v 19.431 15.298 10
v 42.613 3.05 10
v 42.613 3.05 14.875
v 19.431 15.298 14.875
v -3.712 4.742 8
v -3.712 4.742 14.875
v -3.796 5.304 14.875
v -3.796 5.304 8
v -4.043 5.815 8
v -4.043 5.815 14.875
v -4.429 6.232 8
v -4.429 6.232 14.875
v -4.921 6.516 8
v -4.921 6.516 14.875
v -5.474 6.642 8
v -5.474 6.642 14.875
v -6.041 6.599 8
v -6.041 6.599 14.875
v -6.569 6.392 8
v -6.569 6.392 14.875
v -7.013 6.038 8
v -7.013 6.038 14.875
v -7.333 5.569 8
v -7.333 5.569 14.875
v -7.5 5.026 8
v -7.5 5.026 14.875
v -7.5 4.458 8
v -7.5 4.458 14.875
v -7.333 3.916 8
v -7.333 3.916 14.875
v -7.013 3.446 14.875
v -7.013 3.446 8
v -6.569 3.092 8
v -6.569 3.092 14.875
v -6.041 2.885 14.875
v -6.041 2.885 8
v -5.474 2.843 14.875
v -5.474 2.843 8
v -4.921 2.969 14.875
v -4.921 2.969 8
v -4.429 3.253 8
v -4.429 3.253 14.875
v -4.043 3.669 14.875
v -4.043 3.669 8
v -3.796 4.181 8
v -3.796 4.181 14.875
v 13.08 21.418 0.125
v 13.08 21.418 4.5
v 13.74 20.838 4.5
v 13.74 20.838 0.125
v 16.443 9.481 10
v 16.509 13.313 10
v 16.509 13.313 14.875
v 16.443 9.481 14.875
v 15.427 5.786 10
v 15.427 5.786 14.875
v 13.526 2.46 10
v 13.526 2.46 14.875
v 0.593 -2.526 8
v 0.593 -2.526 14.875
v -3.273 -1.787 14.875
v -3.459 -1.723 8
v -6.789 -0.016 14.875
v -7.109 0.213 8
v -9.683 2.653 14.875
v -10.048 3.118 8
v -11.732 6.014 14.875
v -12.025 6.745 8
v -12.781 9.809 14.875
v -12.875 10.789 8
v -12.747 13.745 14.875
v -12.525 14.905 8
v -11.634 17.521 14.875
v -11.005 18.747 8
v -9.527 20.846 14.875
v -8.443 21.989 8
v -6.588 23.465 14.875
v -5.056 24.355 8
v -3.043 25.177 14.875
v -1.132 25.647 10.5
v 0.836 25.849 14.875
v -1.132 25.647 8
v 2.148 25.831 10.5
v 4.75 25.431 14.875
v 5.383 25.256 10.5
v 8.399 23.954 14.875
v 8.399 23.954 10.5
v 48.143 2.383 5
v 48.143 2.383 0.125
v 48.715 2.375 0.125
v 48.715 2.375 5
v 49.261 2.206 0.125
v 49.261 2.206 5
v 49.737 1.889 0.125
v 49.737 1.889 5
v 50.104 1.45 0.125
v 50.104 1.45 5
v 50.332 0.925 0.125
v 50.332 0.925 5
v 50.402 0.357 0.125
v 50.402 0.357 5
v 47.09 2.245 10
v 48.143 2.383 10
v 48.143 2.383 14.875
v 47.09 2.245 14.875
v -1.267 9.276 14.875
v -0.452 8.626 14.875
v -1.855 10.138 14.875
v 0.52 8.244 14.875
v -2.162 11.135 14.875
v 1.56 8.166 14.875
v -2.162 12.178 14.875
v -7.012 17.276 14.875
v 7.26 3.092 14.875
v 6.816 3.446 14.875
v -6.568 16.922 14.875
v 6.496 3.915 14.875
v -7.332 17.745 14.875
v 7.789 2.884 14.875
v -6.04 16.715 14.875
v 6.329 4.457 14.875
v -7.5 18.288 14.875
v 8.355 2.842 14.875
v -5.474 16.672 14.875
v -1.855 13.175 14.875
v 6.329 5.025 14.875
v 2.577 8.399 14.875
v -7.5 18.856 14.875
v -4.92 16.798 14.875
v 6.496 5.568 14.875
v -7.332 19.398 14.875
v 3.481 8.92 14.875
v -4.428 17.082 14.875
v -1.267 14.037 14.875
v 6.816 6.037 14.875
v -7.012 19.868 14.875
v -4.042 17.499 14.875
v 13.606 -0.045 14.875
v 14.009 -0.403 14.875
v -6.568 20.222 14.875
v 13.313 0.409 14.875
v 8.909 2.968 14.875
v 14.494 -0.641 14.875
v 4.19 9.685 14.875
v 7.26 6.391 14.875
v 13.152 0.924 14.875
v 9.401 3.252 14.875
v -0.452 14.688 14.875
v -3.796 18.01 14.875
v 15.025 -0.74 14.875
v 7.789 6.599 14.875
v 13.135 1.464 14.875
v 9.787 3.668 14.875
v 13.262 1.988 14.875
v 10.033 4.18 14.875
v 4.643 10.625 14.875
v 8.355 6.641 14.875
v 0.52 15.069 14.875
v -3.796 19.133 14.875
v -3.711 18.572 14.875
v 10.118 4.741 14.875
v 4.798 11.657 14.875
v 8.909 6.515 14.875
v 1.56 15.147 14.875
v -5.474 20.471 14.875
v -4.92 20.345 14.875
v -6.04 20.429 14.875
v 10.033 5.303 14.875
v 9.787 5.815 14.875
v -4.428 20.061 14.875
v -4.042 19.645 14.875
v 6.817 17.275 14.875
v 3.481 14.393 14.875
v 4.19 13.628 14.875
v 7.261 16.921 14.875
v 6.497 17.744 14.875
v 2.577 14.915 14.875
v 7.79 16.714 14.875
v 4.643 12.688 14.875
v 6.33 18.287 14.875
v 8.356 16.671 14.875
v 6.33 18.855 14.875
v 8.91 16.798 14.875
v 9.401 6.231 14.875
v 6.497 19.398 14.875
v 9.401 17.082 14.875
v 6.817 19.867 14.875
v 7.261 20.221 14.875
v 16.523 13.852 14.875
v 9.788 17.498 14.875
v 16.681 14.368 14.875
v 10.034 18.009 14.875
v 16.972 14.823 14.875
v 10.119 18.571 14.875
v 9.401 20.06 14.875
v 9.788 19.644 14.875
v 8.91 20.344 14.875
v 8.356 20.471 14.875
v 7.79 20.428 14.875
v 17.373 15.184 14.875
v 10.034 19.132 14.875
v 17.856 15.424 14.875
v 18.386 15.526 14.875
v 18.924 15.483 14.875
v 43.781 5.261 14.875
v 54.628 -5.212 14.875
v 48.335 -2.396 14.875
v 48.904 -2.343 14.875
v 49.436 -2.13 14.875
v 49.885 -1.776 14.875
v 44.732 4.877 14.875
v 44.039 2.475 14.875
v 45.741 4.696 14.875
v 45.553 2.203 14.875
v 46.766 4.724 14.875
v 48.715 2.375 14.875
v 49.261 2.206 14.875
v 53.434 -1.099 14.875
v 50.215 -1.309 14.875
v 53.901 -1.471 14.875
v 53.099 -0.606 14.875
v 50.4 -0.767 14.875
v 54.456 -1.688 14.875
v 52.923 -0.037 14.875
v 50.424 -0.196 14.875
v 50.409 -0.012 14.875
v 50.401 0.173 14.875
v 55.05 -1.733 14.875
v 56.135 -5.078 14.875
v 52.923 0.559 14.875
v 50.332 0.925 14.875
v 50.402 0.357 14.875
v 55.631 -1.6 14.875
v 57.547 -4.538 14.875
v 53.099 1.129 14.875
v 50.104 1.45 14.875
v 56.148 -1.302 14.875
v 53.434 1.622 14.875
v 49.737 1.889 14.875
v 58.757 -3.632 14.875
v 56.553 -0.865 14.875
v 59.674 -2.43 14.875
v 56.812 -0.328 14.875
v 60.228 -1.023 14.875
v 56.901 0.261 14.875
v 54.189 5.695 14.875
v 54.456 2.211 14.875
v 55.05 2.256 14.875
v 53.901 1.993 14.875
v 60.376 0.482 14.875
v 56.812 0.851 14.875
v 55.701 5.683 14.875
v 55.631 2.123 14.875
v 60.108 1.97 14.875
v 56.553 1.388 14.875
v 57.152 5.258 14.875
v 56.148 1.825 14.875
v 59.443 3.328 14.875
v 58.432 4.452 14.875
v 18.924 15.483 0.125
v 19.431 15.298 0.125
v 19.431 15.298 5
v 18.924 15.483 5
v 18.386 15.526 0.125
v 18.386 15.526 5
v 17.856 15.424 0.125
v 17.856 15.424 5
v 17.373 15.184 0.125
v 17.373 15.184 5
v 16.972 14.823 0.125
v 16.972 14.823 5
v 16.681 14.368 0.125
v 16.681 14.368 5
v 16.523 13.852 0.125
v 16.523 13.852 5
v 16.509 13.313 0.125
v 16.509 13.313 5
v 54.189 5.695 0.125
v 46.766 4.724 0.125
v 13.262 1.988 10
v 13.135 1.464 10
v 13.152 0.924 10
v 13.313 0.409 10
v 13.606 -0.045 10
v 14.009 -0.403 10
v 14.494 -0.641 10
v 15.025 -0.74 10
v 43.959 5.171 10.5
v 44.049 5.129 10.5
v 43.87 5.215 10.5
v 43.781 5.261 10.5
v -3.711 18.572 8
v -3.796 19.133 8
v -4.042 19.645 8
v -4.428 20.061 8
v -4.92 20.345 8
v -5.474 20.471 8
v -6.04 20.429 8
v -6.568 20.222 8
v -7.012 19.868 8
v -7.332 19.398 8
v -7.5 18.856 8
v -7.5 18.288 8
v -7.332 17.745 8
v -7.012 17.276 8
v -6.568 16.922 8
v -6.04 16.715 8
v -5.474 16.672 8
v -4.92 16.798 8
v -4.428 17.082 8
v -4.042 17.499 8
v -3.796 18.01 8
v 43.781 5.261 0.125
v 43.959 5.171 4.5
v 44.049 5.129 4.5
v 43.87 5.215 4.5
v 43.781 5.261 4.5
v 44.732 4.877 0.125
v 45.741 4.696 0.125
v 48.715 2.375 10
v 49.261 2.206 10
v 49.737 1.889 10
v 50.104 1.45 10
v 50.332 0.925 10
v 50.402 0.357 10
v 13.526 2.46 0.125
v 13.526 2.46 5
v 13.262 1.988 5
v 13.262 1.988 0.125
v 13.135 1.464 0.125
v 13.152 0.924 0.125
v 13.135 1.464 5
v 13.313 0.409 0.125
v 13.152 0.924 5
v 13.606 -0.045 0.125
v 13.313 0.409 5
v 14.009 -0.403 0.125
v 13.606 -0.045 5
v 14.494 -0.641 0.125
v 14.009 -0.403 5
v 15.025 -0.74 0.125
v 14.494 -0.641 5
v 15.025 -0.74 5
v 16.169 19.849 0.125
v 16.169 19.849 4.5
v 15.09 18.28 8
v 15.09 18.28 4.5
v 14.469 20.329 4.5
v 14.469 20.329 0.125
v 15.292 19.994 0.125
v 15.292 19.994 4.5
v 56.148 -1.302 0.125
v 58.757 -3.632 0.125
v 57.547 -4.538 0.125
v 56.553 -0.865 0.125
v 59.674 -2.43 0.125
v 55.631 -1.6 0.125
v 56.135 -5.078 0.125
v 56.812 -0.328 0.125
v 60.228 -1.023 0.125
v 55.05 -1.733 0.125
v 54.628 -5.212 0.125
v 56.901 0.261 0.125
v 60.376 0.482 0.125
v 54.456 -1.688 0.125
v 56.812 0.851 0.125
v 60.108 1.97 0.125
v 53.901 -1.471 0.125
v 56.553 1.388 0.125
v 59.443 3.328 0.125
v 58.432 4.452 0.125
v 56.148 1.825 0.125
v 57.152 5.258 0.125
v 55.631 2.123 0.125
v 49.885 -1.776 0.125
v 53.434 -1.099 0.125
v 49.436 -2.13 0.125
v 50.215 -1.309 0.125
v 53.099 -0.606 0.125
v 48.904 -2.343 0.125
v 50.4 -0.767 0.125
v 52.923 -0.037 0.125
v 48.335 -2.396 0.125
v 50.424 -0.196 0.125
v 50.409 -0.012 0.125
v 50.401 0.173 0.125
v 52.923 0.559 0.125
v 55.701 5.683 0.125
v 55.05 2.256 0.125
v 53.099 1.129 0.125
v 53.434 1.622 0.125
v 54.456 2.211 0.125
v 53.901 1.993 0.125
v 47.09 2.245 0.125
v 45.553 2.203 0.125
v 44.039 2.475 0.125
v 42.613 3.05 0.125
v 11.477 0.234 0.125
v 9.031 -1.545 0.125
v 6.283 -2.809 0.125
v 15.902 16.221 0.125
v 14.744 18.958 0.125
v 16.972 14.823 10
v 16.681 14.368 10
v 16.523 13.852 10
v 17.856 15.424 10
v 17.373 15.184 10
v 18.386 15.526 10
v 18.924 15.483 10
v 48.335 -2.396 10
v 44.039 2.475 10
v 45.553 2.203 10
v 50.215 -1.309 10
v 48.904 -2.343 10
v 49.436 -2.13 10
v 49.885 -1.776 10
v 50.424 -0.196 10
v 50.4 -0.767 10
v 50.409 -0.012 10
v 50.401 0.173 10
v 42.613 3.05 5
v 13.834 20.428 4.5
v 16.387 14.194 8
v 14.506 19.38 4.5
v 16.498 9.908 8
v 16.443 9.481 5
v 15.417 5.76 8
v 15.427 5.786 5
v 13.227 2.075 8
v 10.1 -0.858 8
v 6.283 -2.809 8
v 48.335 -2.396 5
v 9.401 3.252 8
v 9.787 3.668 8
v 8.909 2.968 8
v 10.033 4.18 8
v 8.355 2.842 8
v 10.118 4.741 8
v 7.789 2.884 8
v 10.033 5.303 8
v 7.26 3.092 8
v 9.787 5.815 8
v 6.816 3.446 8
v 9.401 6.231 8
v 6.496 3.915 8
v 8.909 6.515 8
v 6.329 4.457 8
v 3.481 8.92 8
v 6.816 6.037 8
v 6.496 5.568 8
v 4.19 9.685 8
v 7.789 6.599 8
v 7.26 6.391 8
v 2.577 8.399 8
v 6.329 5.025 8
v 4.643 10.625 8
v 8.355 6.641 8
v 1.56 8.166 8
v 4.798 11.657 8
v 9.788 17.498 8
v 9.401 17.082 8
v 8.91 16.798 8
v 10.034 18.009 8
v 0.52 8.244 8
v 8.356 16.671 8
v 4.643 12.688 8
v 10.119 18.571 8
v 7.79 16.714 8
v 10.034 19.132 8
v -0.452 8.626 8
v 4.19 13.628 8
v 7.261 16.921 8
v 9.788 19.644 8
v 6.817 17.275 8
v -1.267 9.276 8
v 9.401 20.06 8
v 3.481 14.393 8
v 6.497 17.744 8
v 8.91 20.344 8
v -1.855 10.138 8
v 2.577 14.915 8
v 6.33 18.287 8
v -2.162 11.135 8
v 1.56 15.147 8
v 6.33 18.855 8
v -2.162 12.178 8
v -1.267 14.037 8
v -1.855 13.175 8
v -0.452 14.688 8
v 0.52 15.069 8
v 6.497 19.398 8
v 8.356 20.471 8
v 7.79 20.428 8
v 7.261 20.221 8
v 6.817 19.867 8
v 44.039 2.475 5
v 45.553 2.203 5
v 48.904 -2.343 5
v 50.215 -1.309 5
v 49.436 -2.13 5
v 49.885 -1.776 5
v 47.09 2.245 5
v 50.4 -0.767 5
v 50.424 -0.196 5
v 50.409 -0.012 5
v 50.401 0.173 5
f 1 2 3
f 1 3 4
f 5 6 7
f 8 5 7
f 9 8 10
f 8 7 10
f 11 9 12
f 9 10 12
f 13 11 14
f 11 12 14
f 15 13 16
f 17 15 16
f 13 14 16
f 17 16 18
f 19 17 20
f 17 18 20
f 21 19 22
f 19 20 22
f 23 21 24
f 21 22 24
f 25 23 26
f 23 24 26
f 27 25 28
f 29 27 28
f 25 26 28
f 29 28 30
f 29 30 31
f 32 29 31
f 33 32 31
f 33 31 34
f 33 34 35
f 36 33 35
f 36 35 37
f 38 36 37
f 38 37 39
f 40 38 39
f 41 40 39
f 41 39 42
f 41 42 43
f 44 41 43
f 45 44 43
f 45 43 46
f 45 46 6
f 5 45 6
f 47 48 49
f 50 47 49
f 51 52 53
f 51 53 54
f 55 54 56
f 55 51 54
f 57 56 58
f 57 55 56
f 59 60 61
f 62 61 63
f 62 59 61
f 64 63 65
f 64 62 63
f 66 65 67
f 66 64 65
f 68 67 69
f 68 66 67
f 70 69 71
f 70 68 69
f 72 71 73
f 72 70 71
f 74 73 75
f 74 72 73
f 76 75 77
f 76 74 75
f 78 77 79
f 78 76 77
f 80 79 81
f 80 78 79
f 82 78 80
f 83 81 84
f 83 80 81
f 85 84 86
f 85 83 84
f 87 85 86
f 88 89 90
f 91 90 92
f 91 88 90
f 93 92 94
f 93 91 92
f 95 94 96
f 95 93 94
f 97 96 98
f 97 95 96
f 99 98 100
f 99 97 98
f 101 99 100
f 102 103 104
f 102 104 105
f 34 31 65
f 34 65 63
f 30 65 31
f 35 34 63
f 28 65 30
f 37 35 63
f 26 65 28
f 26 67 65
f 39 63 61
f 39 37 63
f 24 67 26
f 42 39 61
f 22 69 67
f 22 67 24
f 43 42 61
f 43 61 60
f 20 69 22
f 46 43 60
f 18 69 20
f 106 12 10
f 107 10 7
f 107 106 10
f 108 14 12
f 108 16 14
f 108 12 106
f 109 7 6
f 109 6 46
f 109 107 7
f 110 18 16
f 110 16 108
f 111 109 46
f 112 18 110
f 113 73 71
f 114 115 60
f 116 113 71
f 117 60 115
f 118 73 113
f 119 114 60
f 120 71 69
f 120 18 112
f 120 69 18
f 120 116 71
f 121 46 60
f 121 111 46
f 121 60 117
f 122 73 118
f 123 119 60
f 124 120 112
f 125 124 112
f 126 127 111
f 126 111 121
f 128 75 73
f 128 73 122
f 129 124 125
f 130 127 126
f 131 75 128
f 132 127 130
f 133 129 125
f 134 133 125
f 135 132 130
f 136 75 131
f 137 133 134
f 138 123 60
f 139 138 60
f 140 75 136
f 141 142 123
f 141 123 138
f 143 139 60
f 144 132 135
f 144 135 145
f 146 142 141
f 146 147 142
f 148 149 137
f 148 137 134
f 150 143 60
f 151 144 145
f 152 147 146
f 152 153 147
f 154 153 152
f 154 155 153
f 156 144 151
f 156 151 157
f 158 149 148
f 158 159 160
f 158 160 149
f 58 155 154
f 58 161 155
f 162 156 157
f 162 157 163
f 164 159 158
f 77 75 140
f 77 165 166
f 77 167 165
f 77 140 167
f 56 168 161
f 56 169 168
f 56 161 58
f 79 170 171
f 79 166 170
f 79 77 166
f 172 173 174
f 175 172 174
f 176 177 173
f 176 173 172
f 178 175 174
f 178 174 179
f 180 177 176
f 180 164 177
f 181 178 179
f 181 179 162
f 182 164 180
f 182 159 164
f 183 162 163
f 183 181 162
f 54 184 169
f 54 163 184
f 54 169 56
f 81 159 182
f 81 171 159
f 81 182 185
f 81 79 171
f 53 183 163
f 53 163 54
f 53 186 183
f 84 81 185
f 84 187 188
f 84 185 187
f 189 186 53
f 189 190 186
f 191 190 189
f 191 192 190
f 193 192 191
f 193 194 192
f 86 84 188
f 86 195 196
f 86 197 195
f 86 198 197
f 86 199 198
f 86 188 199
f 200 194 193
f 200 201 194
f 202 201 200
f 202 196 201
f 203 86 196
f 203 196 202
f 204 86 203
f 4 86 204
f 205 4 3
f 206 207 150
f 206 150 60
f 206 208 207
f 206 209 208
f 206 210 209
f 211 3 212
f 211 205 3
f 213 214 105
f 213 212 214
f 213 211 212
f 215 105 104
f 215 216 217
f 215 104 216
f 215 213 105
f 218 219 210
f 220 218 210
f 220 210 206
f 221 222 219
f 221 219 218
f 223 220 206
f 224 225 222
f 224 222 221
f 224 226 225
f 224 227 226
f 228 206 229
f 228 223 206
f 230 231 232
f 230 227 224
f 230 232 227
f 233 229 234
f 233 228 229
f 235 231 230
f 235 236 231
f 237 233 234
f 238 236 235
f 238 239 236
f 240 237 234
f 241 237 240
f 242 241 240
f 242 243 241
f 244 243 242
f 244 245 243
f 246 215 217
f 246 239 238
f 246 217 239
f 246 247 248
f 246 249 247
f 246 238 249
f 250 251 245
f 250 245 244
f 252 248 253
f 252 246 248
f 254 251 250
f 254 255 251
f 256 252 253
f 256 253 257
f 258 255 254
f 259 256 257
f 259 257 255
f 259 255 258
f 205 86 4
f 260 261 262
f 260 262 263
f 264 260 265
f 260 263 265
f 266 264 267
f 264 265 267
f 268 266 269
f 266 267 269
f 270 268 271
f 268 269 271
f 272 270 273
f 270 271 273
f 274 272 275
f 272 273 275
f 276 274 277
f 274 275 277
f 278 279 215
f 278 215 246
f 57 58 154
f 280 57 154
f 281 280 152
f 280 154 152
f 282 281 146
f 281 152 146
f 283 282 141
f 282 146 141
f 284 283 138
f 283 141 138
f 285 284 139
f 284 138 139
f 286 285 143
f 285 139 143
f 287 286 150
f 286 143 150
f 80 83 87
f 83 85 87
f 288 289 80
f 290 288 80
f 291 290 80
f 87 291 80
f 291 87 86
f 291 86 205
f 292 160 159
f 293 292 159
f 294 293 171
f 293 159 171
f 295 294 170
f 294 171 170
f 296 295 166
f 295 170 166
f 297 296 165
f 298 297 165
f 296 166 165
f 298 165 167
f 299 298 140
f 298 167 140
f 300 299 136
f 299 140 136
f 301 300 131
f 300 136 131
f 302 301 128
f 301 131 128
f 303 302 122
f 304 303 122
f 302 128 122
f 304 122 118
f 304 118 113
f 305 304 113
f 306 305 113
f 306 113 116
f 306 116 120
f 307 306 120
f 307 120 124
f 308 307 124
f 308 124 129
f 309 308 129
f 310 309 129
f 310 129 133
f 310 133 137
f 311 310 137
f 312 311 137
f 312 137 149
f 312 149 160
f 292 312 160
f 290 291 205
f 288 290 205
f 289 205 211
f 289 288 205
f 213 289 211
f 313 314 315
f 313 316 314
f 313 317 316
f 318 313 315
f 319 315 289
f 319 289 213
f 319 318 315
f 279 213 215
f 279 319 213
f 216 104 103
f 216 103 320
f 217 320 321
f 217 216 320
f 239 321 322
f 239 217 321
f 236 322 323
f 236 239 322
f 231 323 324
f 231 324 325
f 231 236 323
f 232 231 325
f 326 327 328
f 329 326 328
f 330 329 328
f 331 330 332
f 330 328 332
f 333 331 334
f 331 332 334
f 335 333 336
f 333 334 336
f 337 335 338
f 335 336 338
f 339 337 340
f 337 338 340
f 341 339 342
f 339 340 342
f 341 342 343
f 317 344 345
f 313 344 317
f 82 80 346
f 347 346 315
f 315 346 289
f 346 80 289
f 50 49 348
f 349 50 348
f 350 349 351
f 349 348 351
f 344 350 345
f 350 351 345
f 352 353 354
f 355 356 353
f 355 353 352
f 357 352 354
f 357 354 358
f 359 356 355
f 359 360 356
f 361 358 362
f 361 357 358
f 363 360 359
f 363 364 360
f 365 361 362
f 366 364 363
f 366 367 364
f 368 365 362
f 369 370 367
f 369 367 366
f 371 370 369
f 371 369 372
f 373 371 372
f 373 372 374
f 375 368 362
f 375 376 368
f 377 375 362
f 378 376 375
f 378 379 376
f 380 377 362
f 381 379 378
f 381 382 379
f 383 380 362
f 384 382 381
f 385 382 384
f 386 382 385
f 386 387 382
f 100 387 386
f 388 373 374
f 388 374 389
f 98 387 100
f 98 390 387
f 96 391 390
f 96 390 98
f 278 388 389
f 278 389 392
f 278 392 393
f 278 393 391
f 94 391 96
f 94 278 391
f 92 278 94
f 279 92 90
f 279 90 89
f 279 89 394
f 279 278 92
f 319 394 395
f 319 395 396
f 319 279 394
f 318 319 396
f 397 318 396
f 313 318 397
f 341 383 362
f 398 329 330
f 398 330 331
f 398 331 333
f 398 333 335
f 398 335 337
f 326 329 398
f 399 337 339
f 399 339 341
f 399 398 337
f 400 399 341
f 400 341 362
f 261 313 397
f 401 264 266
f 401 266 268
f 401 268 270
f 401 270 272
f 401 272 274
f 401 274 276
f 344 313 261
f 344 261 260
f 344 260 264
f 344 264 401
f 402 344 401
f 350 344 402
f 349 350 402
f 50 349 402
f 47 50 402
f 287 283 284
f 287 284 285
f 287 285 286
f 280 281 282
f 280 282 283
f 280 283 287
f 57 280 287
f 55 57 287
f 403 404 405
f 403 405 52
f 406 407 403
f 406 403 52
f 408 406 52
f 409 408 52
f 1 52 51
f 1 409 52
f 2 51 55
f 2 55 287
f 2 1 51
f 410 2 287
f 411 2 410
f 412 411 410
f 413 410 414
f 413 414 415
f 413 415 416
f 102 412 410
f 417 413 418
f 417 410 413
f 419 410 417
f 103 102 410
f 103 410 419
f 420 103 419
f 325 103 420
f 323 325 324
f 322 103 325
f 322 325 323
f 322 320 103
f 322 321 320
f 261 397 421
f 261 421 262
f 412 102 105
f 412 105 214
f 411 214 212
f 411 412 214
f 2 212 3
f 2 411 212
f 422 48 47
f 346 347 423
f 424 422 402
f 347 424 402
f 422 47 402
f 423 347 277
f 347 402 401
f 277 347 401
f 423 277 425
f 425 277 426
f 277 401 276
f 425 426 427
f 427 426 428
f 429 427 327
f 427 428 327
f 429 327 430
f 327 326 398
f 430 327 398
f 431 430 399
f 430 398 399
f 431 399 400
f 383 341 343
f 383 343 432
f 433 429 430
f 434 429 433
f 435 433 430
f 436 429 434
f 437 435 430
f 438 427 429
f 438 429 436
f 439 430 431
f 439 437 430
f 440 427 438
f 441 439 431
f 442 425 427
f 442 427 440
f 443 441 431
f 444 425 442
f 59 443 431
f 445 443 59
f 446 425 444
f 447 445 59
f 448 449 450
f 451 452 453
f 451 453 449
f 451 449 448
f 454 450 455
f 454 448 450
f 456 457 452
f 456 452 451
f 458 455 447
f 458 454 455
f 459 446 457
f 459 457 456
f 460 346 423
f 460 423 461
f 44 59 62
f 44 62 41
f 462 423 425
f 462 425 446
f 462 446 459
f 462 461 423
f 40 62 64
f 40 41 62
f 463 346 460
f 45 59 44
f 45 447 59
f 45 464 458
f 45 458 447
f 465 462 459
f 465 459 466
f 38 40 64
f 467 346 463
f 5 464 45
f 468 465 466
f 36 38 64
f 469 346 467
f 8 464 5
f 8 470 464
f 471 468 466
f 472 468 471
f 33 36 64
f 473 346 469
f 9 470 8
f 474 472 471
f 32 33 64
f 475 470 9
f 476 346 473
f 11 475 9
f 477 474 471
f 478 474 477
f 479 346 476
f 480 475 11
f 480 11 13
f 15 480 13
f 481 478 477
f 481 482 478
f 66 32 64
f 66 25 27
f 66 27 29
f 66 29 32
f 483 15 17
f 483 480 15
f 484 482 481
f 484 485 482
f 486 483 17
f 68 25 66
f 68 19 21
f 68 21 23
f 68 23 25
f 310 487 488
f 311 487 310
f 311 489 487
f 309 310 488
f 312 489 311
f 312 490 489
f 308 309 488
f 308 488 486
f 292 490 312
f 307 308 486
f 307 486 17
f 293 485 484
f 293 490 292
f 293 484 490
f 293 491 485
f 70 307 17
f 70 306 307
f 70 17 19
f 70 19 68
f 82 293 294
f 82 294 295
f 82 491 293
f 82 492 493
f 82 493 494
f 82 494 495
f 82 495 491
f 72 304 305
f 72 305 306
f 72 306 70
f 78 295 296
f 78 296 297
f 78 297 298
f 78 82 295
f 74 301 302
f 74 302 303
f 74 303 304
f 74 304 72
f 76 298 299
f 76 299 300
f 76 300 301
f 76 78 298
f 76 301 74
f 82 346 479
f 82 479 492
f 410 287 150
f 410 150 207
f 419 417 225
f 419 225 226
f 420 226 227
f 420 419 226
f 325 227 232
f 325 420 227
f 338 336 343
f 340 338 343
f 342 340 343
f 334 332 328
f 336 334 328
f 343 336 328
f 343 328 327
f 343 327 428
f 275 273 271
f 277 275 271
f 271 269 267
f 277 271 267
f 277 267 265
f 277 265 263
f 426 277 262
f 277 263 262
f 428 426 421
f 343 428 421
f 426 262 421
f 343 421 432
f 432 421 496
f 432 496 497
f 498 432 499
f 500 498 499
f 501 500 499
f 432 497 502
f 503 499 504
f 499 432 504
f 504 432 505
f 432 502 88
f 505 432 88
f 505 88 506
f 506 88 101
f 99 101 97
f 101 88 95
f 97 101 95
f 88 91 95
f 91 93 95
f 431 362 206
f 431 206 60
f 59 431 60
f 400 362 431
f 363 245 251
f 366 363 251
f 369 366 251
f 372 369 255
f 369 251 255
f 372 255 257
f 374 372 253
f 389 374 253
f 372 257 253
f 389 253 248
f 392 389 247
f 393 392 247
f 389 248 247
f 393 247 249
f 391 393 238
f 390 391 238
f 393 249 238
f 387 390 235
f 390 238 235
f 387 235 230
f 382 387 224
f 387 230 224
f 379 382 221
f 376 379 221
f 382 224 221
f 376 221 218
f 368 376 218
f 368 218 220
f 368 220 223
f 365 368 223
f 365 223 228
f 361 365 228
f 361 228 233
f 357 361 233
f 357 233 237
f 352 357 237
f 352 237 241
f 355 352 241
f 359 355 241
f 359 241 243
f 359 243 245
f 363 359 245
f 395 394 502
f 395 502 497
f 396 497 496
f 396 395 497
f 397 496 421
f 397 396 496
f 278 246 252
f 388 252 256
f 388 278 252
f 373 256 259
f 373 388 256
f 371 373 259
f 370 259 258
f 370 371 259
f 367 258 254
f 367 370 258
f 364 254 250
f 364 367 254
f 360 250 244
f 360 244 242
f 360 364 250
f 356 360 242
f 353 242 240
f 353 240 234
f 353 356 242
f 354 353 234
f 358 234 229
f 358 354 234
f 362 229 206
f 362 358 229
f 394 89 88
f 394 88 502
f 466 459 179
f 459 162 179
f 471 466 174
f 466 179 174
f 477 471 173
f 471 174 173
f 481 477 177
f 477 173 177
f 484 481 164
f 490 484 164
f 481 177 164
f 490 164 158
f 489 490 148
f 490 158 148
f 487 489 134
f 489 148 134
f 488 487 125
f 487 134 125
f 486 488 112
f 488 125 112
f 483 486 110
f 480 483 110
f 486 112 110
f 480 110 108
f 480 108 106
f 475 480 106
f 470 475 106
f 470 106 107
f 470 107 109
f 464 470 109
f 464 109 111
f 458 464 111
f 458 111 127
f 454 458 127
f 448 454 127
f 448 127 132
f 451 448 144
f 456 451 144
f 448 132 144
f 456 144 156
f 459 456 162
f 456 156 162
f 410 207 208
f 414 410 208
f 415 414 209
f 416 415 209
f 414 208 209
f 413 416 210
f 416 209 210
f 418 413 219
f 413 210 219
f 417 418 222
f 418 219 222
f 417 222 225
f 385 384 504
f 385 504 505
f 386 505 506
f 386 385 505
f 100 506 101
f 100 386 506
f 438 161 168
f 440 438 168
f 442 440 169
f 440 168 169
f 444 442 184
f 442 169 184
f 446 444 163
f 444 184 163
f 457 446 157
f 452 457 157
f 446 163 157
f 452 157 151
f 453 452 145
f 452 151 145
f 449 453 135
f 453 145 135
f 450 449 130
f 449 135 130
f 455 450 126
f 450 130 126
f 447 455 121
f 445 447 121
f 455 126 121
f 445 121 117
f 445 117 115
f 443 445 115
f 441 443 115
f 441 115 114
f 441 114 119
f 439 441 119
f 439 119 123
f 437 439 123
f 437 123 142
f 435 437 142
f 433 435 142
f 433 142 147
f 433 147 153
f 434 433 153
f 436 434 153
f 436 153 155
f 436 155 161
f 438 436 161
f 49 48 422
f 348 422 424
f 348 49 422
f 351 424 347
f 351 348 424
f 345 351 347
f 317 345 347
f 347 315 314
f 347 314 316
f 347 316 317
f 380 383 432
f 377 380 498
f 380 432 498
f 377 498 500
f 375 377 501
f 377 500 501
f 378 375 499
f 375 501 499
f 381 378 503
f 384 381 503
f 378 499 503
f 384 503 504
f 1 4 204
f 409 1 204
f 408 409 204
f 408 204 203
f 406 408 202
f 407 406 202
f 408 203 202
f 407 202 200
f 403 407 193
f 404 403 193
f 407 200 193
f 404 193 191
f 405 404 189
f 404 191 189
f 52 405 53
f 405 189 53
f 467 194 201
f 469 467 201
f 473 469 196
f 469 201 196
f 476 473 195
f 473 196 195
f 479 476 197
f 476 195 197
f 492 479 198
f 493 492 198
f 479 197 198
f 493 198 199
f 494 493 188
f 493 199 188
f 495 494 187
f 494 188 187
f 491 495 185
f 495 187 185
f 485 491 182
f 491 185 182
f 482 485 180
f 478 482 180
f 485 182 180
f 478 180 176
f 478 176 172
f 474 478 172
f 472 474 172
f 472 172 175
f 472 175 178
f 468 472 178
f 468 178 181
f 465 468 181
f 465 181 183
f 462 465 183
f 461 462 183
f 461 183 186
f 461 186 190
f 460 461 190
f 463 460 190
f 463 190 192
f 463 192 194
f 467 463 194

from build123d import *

# Parameters (mm, degrees)
BOSS_EXTRUDE1_DEPTH                     = 15
F_4_0_4_DIAMETER_HOLE1_D                = 4
CBORE_FOR_M6_HEX_HEAD_BOLT1_D           = 7
CBORE_FOR_M6_HEX_HEAD_BOLT1_CBORE_D     = 25.6
CBORE_FOR_M6_HEX_HEAD_BOLT1_CBORE_DEPTH = 3
SHELL1_DEPTH                            = 5
CUT_EXTRUDE4_START                      = 5
CUT_EXTRUDE4_DEPTH                      = 5
CUT_EXTRUDE5_DEPTH                      = 3
CUT_EXTRUDE5_DEPTH_BACK                 = 3
SKETCH23_R                              = 5
CUT_EXTRUDE6_DEPTH                      = 67.110950493
CUT_EXTRUDE6_DEPTH_BACK                 = 3
FILLET1_R                               = 2
SKETCH30_W                              = 87.8922038
SKETCH30_H                              = 63.386693804
CUT_EXTRUDE8_DEPTH                      = 0.125
SKETCH31_W                              = 82.344977649
SKETCH31_H                              = 39.024548637
CUT_EXTRUDE9_DEPTH                      = 0.125
SKETCH38_R                              = 1.905
CUT_EXTRUDE10_DEPTH                     = 68.319909946
SKETCH39_R                              = 15.3
CUT_EXTRUDE11_DEPTH                     = 7.875


# Read off the part's stored shape, not the designer's step: Shell1
with BuildPart() as part:
    # Sketch1 → Boss-Extrude1 (new body)
    with BuildSketch(Plane(origin=(0, 0, 0), x_dir=(-1, 0, 0), z_dir=(0, 0, -1))):
        with BuildLine():
            Line((-54.628463331, -5.212133486), (-0.593380164, -2.525889334))
            ThreePointArc((-0.593380164, -2.525889334), (12.32206912, 15.671805741), (-8.399323253, 23.953643362))
            Line((-8.399323253, 23.953643362), (-43.781031906, 5.260553383))
            ThreePointArc((-43.781031906, 5.260553383), (-45.231601083, 4.760443022), (-46.765522471, 4.723748524))
            Line((-46.765522471, 4.723748524), (-54.189447973, 5.695292216))
            ThreePointArc((-54.189447973, 5.695292216), (-60.376392814, 0.481764046), (-54.628463331, -5.212133486))
        make_face()
    extrude(amount=-BOSS_EXTRUDE1_DEPTH)

    # Ø4.0 (4) Diameter Hole1 (through all)
    with Locations(Plane(origin=(0, 0, 0), x_dir=(-1, 0, 0), z_dir=(0, 0, -1))):
        with Locations((-54.900567232, 0.261366347)):
            Hole(F_4_0_4_DIAMETER_HOLE1_D / 2)

    # CBORE for M6 Hex Head Bolt1 (through all)
    with Locations(Plane(origin=(0, 0, 0), x_dir=(-1, 0, 0), z_dir=(0, 0, -1))):
        with Locations((-1.298433566, 11.656596333)):
            CounterBoreHole(CBORE_FOR_M6_HEX_HEAD_BOLT1_D / 2, CBORE_FOR_M6_HEX_HEAD_BOLT1_CBORE_D / 2, CBORE_FOR_M6_HEX_HEAD_BOLT1_CBORE_DEPTH)

    # Shell1 outline → Shell1 (cut)
    with BuildSketch(Plane.XY):
        with BuildLine():
            Line((51.170699652, 2.778922273), (47.089922847, 2.244884995))
            ThreePointArc((47.089922847, 2.244884995), (44.789040765, 2.299926742), (42.613186999, 3.050092283))
            Line((42.613186999, 3.050092283), (15.48696558, 17.381590594))
            ThreePointArc((15.48696558, 17.381590594), (16.050757412, 7.599634274), (10.564355185, -0.518488741))
            Line((10.564355185, -0.518488741), (51.385096413, -2.547808785))
            ThreePointArc((51.385096413, -2.547808785), (50.404207808, 0.080391395), (51.170699652, 2.778922273))
        make_face()
    extrude(amount=SHELL1_DEPTH, mode=Mode.SUBTRACT)

    # Sketch21 → Cut-Extrude4 (cut)
    with BuildSketch(Plane(origin=(0, 0, 15), x_dir=(-1, 0, 0), z_dir=(0, 0, -1)).offset(CUT_EXTRUDE4_START)):
        with BuildLine():
            Line((-51.170699652, 2.778922273), (-47.089922847, 2.244884995))
            ThreePointArc((-47.089922847, 2.244884995), (-44.789040765, 2.299926742), (-42.613186999, 3.050092283))
            Line((-42.613186999, 3.050092283), (-15.48696558, 17.381590594))
            ThreePointArc((-15.48696558, 17.381590594), (-16.050757412, 7.599634274), (-10.564355185, -0.518488741))
            Line((-10.564355185, -0.518488741), (-51.385096413, -2.547808785))
            ThreePointArc((-51.385096413, -2.547808785), (-50.404207808, 0.080391395), (-51.170699652, 2.778922273))
        make_face()
    extrude(amount=-CUT_EXTRUDE4_DEPTH, mode=Mode.SUBTRACT)

    # Sketch23 → Cut-Extrude5 (cut, two sides: drawn at the far end of the back side and taken through both)
    with BuildSketch(Plane(origin=(0, 0, 7.5), x_dir=(-1, 0, 0), z_dir=(0, 0, -1)).offset(-CUT_EXTRUDE5_DEPTH_BACK)):
        with Locations((-65.267572651, 7.904637809)):
            Circle(SKETCH23_R)
        Polygon((2.769070011, 26.390627774), (-44.049268023, 5.128933961), (-46.116721719, 9.681475582), (0.701616314, 30.943169395), align=None)
    extrude(amount=CUT_EXTRUDE5_DEPTH + CUT_EXTRUDE5_DEPTH_BACK, mode=Mode.SUBTRACT)

    # Sketch24 → Cut-Extrude6 (cut, two sides: drawn at the far end of the back side and taken through both)
    with BuildSketch(Plane(origin=(0, 0, 7.5), x_dir=(-1, 0, 0), z_dir=(0, 0, -1)).offset(-CUT_EXTRUDE6_DEPTH_BACK)):
        with BuildLine():
            Line((-9.027257312, 24.978582277), (-13.74014268, 20.838163554))
            ThreePointArc((-13.74014268, 20.838163554), (-20.357630392, 23.419198741), (-14.432959892, 27.337255112))
            Line((-14.432959892, 27.337255112), (-9.027257312, 24.978582277))
        make_face()
    extrude(amount=CUT_EXTRUDE6_DEPTH + CUT_EXTRUDE6_DEPTH_BACK, mode=Mode.SUBTRACT)

    # Fillet1
    fillet1_edges = [part.edges().sort_by_distance(p)[0] for p in [
        (10.564355185, -0.518488741, 2.5),
        (51.170699652, 2.778922273, 2.5),
        (51.385096413, -2.547808785, 2.5),
        (15.48696558, 17.381590594, 2.5),
        (51.170699652, 2.778922273, 12.5),
        (51.385096413, -2.547808785, 12.5),
        (10.564355185, -0.518488741, 12.5),
        (15.48696558, 17.381590594, 12.5),
    ]]
    fillet(fillet1_edges, radius=FILLET1_R)

    # Sketch30 → Cut-Extrude8 (cut)
    with BuildSketch(Plane.XY.offset(15)):
        with Locations((24.760370948, 9.451685766)):
            Rectangle(SKETCH30_W, SKETCH30_H)
    extrude(amount=-CUT_EXTRUDE8_DEPTH, mode=Mode.SUBTRACT)

    # Sketch31 → Cut-Extrude9 (cut)
    with BuildSketch(Plane(origin=(0, 0, 0), x_dir=(-1, 0, 0), z_dir=(0, 0, -1))):
        with Locations((-23.438477607, 10.614160855)):
            Rectangle(SKETCH31_W, SKETCH31_H)
    extrude(amount=-CUT_EXTRUDE9_DEPTH, mode=Mode.SUBTRACT)

    # Sketch38 → Cut-Extrude10 (cut, through all)
    with BuildSketch(Plane.XY.offset(14.875)):
        with Locations((-5.615950455, 18.571806714)):
            Circle(SKETCH38_R)
        with Locations((8.213643947, 18.570980353)):
            Circle(SKETCH38_R)
        with Locations((8.212817586, 4.741385951)):
            Circle(SKETCH38_R)
        with Locations((-5.616776816, 4.742212313)):
            Circle(SKETCH38_R)
    extrude(amount=-CUT_EXTRUDE10_DEPTH, mode=Mode.SUBTRACT)

    # Sketch39 → Cut-Extrude11 (cut)
    with BuildSketch(Plane(origin=(0, 0, 0.125), x_dir=(-1, 0, 0), z_dir=(0, 0, -1))):
        with Locations((-1.298433566, 11.656596333)):
            Circle(SKETCH39_R)
    extrude(amount=-CUT_EXTRUDE11_DEPTH, mode=Mode.SUBTRACT)


solid = part.part
